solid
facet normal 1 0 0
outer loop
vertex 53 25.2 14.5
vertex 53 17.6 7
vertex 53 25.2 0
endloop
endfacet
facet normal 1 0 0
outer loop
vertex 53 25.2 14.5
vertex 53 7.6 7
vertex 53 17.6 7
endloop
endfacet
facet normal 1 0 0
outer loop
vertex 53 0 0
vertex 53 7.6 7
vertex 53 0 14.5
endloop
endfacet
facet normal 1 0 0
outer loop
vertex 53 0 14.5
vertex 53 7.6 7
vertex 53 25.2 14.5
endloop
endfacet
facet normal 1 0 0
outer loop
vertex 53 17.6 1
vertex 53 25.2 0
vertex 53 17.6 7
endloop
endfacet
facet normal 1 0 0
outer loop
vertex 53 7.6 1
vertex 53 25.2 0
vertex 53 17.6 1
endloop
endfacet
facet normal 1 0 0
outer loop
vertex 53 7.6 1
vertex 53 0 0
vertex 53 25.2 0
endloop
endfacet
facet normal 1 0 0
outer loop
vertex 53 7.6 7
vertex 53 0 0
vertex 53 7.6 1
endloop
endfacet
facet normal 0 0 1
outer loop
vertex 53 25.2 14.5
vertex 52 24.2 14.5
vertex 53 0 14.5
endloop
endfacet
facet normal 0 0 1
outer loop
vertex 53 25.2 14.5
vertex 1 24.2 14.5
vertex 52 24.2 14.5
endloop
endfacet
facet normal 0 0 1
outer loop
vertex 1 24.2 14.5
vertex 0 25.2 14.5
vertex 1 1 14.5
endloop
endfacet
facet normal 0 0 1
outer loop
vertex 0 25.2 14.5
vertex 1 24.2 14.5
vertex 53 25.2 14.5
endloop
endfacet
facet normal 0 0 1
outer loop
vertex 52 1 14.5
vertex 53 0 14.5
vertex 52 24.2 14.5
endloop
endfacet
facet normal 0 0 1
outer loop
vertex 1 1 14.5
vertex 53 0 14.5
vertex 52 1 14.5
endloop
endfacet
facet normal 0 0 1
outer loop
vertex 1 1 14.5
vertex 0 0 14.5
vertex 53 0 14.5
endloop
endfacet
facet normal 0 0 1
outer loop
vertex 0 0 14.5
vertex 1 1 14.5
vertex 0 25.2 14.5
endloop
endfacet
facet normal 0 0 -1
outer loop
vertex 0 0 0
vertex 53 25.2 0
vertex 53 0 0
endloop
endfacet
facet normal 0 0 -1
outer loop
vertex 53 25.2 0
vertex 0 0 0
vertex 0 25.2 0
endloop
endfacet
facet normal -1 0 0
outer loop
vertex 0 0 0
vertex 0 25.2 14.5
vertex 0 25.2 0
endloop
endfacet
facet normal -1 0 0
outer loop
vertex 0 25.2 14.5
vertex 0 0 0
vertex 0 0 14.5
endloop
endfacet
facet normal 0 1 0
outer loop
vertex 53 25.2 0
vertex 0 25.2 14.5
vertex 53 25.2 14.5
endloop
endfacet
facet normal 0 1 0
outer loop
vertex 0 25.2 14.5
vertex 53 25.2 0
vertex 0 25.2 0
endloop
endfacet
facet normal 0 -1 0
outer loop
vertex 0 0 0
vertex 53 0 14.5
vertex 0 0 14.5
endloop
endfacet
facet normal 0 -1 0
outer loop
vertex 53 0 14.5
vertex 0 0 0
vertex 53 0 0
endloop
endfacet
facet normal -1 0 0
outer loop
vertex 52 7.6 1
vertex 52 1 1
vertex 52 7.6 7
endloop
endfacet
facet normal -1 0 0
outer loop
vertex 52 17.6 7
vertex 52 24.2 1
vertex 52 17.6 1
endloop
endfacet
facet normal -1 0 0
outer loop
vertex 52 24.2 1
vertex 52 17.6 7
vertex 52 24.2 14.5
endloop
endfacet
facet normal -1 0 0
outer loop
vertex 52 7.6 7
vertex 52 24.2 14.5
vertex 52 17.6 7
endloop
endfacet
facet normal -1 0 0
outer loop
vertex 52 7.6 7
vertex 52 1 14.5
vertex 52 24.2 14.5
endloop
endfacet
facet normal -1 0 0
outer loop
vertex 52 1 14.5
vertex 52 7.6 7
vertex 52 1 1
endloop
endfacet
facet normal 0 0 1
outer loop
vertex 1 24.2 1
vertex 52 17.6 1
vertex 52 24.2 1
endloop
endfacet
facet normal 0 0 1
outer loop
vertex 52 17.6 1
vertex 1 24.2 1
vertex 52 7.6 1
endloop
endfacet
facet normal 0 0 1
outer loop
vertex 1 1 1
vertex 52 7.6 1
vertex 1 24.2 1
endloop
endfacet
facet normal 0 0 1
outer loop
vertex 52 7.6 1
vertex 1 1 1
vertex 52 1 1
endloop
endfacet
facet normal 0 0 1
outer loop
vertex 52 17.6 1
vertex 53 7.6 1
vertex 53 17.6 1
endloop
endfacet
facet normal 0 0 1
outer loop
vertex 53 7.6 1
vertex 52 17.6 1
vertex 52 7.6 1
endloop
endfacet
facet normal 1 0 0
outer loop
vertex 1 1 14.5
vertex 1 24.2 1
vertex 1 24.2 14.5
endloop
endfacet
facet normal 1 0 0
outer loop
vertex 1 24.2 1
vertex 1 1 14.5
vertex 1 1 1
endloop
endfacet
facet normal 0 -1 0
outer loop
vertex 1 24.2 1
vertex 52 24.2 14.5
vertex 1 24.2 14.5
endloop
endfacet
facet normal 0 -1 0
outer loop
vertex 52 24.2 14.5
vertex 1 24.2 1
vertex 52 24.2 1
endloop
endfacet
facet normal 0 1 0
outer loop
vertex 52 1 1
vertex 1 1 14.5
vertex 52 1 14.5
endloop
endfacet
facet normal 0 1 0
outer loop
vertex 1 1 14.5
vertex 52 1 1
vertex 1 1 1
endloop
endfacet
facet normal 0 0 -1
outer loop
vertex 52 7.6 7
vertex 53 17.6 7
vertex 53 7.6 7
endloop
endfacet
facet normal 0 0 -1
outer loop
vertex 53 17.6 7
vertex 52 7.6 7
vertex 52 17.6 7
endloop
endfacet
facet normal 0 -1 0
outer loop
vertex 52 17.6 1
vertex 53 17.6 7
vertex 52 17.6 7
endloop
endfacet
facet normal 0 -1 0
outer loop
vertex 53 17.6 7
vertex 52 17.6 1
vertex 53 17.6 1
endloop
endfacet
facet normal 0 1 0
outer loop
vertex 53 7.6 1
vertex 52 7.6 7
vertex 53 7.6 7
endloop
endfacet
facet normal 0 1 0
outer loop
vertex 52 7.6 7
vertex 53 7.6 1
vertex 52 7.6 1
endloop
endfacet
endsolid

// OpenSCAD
cm = 10;
wall = 1;

inside_w = 5.1*cm;
inside_d = 2.32*cm;

w = wall+inside_w+wall;
d = wall+inside_d+wall;
h = 1.45*cm;

usb_w = 3*wall;
usb_d = 1*cm;
usb_h = .6*cm;

difference () {
    cube([w, d, h]);

    translate([wall, wall, wall])
        cube([inside_w, inside_d, h+1]);

    translate([w-2,(d/2)-(usb_d/2),1])
        cube([usb_w,usb_d,usb_h]);
}
